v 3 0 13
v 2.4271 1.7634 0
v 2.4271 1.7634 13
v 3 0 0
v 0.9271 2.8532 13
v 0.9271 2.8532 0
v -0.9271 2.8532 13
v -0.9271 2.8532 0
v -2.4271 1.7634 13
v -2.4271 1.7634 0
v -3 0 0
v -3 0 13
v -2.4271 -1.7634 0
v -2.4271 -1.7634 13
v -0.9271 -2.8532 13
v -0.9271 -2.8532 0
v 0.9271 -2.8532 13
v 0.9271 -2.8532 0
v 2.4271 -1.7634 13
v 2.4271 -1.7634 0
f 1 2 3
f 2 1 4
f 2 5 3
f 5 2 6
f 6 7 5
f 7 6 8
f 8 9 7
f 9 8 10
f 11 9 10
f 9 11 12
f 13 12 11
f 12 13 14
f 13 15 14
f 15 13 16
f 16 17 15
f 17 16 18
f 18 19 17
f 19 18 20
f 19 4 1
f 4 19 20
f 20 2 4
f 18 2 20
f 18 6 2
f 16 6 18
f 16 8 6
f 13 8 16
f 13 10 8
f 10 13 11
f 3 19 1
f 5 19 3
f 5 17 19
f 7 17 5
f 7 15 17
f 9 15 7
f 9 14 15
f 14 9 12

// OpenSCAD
// Generated by SolidPython 1.0.1 on 2020-07-29 00:46:44


cylinder(h = 13, r1 = 3, r2 = 3);
/***********************************************
*********      SolidPython code:      **********
************************************************
 
# import packages: SolidPython
from solid import *
from solid.utils import *
from itertools import chain, combinations, permutations


class Resize:

    def __init__(self, scad_file):
        self.scad_file = scad_file
        #self.scad_file = import_scad(scad_file)
        # cone/cylinder param:
        self.r1 = 0
        self.r2 = 0
        self.h = 0
        # rectangular prism param:
        self.w = 0
        self.l = 0
        # ellipse param:
        self.r = 0

    # import OpenScad code (file name corresponds to shape)


    # classify shape + parameters
    def assign(self, param1, param2, param3):
        if self.scad_file == 'cone.scad':
            self.r1 = param1
            self.r2 = param2
            self.h = param3
        elif self.scad_file == 'cylinder.scad':
            self.r1 = param1
            self.r2 = param2
            self.h = param3
        elif self.scad_file == 'rectangularPrism.scad':
            self.h = param1
            self.l = param2
            self.w = param3
        else:
            self.r = param1
            self.h = param2

    # resize parameters
    def iterate(self):
        x = range(3, 20, 2)
        i = 1
        if self.scad_file == 'cone.scad':
            tempList = list(permutations(x, 2))
            for temp in tempList:
                param1 = temp[0]
                param2 = temp[1]
                filepath = 'produced_scad_files/' + 'cone' + str(param1) + '_' + str(param2) + '_' + '.scad'
                scad_render_to_file(cylinder(h=param1, r1=param2, r2=0), filepath)

        elif self.scad_file == 'cylinder.scad':
            tempList = list(permutations(x, 3))
            for temp in tempList:
                param1 = temp[0]
                param2 = temp[1]
                filepath = 'produced_scad_files/' + 'cylinder' + str(param1) + '_' + str(param2) + '_' + '.scad'
                scad_render_to_file(cylinder(h=param1, r1=param2, r2=param2), filepath)

        elif self.scad_file == 'rectangularPrism.scad':
            tempList = list(permutations(x, 3))
            for temp in tempList:
                param1 = temp[0]
                param2 = temp[1]
                param3 = temp[2]
                filepath = 'produced_scad_files/' + 'rectangularPrism' + str(param1) + '_' + str(param2) + '_' + str(
                    param3) + '.scad'
                scad_render_to_file(cube(size=(param1, param2, param3)), filepath)

        elif self.scad_file == 'ellipse.scad':
            tempList = list(permutations(x, 4))
            for temp in tempList:
                param1 = temp[0]
                param2 = temp[1]
                param3 = temp[2]
                param4 = temp[3]
                filepath = 'produced_scad_files/' + 'ellipse' + str(param1) + '_' + str(param2) + '_' + str(param3) + '_' + str(param4) + '.scad'
                scad_render_to_file(scale([param1, param2, param3])(sphere(r=param4)), filepath)

    def render_to_scadfile(self):
        scad_render_to_file(scad, 'example.scad') 
 
************************************************/
